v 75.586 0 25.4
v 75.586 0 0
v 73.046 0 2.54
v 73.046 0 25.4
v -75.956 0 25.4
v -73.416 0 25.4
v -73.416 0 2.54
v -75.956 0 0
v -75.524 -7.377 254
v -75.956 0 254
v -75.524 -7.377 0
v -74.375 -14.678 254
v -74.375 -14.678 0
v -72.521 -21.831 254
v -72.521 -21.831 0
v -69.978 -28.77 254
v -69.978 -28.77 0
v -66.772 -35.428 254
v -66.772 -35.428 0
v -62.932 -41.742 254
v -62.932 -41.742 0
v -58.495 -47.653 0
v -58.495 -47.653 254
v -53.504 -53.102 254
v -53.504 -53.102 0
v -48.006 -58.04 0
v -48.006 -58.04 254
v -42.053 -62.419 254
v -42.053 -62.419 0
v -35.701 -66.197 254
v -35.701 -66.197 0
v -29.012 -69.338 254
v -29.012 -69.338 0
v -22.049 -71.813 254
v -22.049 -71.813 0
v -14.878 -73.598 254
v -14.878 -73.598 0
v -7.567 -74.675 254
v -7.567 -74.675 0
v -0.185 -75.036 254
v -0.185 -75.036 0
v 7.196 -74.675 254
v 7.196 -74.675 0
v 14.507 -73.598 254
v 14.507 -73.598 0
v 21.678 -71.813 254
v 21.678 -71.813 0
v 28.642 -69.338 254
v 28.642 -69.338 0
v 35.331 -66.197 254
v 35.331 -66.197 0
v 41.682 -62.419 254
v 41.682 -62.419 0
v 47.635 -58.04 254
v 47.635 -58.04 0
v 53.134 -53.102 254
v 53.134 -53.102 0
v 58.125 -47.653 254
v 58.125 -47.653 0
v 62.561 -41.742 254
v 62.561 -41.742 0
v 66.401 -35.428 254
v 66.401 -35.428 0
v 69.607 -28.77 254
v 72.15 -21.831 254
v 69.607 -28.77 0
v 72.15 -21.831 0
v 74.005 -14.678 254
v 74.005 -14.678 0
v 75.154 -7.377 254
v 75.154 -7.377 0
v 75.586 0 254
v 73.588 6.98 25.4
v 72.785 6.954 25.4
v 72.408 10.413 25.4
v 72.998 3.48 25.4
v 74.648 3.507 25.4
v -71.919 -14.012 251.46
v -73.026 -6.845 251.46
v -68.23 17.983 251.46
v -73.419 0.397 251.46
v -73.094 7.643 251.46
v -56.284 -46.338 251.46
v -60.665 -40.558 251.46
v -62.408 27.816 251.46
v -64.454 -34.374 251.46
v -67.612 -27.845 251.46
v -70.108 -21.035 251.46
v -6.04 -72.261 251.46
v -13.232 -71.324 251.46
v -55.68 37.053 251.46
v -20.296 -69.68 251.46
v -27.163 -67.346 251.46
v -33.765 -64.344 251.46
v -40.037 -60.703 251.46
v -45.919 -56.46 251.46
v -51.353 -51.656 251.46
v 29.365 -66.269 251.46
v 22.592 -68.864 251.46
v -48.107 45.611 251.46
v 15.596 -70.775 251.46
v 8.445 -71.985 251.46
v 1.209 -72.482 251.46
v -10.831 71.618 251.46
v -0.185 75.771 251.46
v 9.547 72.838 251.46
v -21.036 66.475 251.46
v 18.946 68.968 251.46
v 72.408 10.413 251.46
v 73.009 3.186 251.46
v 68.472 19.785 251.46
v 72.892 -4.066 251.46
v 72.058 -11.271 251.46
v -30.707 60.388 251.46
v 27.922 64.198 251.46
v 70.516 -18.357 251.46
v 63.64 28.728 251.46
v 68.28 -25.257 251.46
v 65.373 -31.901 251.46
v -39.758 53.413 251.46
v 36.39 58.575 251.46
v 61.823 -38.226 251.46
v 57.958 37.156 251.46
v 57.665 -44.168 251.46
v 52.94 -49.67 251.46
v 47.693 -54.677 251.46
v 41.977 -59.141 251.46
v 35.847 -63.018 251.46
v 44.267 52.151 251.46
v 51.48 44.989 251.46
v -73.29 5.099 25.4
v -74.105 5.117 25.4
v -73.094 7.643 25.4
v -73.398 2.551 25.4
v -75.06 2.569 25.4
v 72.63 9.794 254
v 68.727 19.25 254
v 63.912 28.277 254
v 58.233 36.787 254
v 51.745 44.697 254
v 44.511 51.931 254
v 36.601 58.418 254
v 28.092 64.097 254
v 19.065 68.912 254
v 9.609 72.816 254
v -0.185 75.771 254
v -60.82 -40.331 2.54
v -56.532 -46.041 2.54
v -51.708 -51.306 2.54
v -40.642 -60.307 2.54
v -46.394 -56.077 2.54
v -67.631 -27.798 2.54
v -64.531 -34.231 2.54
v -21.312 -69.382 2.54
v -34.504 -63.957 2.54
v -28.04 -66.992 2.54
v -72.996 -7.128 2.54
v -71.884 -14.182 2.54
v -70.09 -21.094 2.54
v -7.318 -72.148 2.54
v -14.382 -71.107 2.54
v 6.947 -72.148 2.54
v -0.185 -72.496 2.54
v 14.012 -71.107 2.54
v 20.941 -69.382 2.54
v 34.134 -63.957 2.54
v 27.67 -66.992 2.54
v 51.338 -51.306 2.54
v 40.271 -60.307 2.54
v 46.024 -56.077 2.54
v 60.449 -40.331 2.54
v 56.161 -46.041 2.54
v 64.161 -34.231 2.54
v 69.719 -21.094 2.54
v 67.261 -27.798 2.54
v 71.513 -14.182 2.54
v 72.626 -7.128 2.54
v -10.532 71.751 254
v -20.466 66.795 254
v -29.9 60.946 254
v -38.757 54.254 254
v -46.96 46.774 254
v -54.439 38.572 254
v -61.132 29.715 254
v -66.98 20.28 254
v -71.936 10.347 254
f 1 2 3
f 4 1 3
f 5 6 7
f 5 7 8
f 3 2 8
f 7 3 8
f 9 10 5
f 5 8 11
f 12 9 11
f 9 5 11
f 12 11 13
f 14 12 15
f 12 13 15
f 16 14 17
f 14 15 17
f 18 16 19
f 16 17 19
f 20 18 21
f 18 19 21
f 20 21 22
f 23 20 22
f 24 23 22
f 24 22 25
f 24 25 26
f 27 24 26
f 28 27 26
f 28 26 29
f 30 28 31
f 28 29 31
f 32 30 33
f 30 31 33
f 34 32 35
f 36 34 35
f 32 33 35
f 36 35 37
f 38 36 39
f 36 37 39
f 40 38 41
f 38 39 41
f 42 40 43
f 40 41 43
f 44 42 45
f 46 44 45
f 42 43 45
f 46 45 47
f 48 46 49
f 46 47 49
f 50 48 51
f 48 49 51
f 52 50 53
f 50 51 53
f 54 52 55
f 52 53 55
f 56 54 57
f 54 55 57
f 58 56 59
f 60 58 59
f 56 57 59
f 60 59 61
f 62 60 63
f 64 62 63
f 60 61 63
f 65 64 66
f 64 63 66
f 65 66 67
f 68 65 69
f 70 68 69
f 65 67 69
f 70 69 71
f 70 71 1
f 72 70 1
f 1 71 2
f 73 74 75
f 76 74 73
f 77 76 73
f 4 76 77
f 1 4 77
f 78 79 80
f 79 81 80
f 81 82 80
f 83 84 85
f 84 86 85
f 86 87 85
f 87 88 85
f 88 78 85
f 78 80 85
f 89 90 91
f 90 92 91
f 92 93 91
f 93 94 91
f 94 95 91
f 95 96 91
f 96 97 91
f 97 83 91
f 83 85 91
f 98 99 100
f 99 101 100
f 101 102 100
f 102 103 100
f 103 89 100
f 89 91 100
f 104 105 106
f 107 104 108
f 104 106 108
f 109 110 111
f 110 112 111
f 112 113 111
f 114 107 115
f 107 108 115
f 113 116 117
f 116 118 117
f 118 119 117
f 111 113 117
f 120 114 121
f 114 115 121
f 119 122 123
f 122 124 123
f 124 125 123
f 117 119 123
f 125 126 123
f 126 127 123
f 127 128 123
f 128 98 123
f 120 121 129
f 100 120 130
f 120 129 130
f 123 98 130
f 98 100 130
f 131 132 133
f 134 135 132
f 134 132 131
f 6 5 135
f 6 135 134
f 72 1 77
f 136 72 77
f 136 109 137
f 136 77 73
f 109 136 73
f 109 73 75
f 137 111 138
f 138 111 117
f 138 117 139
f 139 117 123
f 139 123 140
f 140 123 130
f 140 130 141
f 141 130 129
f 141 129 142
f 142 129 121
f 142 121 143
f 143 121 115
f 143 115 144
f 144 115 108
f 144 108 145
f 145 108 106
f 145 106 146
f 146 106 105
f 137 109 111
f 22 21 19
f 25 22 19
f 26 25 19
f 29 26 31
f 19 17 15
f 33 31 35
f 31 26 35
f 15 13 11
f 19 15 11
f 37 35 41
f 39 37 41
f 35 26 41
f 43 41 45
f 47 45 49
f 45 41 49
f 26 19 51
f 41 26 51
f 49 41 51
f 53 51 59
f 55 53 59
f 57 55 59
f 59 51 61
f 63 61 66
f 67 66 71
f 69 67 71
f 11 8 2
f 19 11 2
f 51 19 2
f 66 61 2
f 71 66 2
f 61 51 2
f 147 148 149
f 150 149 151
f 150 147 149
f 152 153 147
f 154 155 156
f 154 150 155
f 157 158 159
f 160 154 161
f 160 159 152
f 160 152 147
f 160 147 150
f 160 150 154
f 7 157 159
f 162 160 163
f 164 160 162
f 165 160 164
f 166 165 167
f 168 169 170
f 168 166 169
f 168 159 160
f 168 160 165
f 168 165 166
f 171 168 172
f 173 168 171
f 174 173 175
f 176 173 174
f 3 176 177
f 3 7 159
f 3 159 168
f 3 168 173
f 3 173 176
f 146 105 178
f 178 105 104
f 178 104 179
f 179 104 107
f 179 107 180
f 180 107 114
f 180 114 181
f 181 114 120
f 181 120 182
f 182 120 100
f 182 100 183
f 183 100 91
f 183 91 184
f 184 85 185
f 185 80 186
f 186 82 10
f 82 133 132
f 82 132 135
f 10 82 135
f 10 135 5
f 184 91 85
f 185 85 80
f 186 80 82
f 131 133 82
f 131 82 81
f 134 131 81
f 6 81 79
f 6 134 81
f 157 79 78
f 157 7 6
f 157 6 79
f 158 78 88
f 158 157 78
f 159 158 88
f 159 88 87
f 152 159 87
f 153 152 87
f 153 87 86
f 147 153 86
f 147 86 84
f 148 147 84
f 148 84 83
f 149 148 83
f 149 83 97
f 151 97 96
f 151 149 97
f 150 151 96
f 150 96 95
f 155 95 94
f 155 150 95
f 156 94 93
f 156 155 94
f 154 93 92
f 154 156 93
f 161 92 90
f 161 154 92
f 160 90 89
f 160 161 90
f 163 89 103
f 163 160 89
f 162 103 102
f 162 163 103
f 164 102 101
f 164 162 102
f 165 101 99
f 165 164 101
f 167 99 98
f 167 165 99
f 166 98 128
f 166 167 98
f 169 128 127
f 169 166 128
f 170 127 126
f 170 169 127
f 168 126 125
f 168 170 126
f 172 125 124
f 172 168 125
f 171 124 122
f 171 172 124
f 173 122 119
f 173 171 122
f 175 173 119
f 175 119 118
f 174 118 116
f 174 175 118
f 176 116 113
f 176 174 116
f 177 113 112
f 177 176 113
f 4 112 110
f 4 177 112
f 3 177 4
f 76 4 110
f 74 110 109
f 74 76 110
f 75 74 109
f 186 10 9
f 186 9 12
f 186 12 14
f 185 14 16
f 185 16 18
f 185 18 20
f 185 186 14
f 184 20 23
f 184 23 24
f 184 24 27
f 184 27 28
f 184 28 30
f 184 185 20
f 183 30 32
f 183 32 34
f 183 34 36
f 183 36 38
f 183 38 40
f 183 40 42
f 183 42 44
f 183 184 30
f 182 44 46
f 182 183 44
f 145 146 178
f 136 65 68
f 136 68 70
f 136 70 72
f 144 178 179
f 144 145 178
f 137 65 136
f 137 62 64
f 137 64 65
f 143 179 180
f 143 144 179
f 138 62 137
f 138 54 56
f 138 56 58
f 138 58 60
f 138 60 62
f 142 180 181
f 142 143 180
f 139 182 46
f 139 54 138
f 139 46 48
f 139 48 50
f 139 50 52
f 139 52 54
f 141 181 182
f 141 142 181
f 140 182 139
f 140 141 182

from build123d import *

# Parameters (mm, degrees)
F1_DEPTH = 254
F2_T     = -2.54
F4_DEPTH = 25.4


with BuildPart() as f1:
    # F0 (on Top) → F1 (new body)
    with BuildSketch(Plane.XY):
        with BuildLine():
            ThreePointArc((-0.185259, 75.771093), (-46.959517, 46.774258), (-75.956352, 0))
            ThreePointArc((-75.956352, 0), (-0.185259, -75.035728), (75.585835, 0))
            ThreePointArc((75.585835, 0), (48.21746, 48.402718), (-0.185259, 75.771093))
        make_face()
    extrude(amount=F1_DEPTH)

    # F2
    f2_openings = [f1.faces().sort_by_distance(p)[0] for p in [
        (-46.959517, 46.774258, 127),
        (48.21746, 48.402718, 127),
    ]]
    offset(amount=F2_T, openings=f2_openings)

    # F3 (on face) → F4 (cut)
    with BuildSketch(Plane(origin=(0, 0, 0), x_dir=(1, 0, 0), z_dir=(0, 0, -1))):
        with BuildLine():
            ThreePointArc((-0.185259, -75.771093), (48.21746, -48.402718), (75.585835, 0))
            Line((75.585835, 0), (0, 0))
            Line((0, 0), (-0.185259, -75.771093))
        make_face()
        with BuildLine():
            Line((-0.185259, -75.771093), (0, 0))
            Line((0, 0), (-75.956352, 0))
            ThreePointArc((-75.956352, 0), (-46.959517, -46.774258), (-0.185259, -75.771093))
        make_face()
    extrude(amount=-F4_DEPTH, mode=Mode.SUBTRACT)


solid = f1.part
